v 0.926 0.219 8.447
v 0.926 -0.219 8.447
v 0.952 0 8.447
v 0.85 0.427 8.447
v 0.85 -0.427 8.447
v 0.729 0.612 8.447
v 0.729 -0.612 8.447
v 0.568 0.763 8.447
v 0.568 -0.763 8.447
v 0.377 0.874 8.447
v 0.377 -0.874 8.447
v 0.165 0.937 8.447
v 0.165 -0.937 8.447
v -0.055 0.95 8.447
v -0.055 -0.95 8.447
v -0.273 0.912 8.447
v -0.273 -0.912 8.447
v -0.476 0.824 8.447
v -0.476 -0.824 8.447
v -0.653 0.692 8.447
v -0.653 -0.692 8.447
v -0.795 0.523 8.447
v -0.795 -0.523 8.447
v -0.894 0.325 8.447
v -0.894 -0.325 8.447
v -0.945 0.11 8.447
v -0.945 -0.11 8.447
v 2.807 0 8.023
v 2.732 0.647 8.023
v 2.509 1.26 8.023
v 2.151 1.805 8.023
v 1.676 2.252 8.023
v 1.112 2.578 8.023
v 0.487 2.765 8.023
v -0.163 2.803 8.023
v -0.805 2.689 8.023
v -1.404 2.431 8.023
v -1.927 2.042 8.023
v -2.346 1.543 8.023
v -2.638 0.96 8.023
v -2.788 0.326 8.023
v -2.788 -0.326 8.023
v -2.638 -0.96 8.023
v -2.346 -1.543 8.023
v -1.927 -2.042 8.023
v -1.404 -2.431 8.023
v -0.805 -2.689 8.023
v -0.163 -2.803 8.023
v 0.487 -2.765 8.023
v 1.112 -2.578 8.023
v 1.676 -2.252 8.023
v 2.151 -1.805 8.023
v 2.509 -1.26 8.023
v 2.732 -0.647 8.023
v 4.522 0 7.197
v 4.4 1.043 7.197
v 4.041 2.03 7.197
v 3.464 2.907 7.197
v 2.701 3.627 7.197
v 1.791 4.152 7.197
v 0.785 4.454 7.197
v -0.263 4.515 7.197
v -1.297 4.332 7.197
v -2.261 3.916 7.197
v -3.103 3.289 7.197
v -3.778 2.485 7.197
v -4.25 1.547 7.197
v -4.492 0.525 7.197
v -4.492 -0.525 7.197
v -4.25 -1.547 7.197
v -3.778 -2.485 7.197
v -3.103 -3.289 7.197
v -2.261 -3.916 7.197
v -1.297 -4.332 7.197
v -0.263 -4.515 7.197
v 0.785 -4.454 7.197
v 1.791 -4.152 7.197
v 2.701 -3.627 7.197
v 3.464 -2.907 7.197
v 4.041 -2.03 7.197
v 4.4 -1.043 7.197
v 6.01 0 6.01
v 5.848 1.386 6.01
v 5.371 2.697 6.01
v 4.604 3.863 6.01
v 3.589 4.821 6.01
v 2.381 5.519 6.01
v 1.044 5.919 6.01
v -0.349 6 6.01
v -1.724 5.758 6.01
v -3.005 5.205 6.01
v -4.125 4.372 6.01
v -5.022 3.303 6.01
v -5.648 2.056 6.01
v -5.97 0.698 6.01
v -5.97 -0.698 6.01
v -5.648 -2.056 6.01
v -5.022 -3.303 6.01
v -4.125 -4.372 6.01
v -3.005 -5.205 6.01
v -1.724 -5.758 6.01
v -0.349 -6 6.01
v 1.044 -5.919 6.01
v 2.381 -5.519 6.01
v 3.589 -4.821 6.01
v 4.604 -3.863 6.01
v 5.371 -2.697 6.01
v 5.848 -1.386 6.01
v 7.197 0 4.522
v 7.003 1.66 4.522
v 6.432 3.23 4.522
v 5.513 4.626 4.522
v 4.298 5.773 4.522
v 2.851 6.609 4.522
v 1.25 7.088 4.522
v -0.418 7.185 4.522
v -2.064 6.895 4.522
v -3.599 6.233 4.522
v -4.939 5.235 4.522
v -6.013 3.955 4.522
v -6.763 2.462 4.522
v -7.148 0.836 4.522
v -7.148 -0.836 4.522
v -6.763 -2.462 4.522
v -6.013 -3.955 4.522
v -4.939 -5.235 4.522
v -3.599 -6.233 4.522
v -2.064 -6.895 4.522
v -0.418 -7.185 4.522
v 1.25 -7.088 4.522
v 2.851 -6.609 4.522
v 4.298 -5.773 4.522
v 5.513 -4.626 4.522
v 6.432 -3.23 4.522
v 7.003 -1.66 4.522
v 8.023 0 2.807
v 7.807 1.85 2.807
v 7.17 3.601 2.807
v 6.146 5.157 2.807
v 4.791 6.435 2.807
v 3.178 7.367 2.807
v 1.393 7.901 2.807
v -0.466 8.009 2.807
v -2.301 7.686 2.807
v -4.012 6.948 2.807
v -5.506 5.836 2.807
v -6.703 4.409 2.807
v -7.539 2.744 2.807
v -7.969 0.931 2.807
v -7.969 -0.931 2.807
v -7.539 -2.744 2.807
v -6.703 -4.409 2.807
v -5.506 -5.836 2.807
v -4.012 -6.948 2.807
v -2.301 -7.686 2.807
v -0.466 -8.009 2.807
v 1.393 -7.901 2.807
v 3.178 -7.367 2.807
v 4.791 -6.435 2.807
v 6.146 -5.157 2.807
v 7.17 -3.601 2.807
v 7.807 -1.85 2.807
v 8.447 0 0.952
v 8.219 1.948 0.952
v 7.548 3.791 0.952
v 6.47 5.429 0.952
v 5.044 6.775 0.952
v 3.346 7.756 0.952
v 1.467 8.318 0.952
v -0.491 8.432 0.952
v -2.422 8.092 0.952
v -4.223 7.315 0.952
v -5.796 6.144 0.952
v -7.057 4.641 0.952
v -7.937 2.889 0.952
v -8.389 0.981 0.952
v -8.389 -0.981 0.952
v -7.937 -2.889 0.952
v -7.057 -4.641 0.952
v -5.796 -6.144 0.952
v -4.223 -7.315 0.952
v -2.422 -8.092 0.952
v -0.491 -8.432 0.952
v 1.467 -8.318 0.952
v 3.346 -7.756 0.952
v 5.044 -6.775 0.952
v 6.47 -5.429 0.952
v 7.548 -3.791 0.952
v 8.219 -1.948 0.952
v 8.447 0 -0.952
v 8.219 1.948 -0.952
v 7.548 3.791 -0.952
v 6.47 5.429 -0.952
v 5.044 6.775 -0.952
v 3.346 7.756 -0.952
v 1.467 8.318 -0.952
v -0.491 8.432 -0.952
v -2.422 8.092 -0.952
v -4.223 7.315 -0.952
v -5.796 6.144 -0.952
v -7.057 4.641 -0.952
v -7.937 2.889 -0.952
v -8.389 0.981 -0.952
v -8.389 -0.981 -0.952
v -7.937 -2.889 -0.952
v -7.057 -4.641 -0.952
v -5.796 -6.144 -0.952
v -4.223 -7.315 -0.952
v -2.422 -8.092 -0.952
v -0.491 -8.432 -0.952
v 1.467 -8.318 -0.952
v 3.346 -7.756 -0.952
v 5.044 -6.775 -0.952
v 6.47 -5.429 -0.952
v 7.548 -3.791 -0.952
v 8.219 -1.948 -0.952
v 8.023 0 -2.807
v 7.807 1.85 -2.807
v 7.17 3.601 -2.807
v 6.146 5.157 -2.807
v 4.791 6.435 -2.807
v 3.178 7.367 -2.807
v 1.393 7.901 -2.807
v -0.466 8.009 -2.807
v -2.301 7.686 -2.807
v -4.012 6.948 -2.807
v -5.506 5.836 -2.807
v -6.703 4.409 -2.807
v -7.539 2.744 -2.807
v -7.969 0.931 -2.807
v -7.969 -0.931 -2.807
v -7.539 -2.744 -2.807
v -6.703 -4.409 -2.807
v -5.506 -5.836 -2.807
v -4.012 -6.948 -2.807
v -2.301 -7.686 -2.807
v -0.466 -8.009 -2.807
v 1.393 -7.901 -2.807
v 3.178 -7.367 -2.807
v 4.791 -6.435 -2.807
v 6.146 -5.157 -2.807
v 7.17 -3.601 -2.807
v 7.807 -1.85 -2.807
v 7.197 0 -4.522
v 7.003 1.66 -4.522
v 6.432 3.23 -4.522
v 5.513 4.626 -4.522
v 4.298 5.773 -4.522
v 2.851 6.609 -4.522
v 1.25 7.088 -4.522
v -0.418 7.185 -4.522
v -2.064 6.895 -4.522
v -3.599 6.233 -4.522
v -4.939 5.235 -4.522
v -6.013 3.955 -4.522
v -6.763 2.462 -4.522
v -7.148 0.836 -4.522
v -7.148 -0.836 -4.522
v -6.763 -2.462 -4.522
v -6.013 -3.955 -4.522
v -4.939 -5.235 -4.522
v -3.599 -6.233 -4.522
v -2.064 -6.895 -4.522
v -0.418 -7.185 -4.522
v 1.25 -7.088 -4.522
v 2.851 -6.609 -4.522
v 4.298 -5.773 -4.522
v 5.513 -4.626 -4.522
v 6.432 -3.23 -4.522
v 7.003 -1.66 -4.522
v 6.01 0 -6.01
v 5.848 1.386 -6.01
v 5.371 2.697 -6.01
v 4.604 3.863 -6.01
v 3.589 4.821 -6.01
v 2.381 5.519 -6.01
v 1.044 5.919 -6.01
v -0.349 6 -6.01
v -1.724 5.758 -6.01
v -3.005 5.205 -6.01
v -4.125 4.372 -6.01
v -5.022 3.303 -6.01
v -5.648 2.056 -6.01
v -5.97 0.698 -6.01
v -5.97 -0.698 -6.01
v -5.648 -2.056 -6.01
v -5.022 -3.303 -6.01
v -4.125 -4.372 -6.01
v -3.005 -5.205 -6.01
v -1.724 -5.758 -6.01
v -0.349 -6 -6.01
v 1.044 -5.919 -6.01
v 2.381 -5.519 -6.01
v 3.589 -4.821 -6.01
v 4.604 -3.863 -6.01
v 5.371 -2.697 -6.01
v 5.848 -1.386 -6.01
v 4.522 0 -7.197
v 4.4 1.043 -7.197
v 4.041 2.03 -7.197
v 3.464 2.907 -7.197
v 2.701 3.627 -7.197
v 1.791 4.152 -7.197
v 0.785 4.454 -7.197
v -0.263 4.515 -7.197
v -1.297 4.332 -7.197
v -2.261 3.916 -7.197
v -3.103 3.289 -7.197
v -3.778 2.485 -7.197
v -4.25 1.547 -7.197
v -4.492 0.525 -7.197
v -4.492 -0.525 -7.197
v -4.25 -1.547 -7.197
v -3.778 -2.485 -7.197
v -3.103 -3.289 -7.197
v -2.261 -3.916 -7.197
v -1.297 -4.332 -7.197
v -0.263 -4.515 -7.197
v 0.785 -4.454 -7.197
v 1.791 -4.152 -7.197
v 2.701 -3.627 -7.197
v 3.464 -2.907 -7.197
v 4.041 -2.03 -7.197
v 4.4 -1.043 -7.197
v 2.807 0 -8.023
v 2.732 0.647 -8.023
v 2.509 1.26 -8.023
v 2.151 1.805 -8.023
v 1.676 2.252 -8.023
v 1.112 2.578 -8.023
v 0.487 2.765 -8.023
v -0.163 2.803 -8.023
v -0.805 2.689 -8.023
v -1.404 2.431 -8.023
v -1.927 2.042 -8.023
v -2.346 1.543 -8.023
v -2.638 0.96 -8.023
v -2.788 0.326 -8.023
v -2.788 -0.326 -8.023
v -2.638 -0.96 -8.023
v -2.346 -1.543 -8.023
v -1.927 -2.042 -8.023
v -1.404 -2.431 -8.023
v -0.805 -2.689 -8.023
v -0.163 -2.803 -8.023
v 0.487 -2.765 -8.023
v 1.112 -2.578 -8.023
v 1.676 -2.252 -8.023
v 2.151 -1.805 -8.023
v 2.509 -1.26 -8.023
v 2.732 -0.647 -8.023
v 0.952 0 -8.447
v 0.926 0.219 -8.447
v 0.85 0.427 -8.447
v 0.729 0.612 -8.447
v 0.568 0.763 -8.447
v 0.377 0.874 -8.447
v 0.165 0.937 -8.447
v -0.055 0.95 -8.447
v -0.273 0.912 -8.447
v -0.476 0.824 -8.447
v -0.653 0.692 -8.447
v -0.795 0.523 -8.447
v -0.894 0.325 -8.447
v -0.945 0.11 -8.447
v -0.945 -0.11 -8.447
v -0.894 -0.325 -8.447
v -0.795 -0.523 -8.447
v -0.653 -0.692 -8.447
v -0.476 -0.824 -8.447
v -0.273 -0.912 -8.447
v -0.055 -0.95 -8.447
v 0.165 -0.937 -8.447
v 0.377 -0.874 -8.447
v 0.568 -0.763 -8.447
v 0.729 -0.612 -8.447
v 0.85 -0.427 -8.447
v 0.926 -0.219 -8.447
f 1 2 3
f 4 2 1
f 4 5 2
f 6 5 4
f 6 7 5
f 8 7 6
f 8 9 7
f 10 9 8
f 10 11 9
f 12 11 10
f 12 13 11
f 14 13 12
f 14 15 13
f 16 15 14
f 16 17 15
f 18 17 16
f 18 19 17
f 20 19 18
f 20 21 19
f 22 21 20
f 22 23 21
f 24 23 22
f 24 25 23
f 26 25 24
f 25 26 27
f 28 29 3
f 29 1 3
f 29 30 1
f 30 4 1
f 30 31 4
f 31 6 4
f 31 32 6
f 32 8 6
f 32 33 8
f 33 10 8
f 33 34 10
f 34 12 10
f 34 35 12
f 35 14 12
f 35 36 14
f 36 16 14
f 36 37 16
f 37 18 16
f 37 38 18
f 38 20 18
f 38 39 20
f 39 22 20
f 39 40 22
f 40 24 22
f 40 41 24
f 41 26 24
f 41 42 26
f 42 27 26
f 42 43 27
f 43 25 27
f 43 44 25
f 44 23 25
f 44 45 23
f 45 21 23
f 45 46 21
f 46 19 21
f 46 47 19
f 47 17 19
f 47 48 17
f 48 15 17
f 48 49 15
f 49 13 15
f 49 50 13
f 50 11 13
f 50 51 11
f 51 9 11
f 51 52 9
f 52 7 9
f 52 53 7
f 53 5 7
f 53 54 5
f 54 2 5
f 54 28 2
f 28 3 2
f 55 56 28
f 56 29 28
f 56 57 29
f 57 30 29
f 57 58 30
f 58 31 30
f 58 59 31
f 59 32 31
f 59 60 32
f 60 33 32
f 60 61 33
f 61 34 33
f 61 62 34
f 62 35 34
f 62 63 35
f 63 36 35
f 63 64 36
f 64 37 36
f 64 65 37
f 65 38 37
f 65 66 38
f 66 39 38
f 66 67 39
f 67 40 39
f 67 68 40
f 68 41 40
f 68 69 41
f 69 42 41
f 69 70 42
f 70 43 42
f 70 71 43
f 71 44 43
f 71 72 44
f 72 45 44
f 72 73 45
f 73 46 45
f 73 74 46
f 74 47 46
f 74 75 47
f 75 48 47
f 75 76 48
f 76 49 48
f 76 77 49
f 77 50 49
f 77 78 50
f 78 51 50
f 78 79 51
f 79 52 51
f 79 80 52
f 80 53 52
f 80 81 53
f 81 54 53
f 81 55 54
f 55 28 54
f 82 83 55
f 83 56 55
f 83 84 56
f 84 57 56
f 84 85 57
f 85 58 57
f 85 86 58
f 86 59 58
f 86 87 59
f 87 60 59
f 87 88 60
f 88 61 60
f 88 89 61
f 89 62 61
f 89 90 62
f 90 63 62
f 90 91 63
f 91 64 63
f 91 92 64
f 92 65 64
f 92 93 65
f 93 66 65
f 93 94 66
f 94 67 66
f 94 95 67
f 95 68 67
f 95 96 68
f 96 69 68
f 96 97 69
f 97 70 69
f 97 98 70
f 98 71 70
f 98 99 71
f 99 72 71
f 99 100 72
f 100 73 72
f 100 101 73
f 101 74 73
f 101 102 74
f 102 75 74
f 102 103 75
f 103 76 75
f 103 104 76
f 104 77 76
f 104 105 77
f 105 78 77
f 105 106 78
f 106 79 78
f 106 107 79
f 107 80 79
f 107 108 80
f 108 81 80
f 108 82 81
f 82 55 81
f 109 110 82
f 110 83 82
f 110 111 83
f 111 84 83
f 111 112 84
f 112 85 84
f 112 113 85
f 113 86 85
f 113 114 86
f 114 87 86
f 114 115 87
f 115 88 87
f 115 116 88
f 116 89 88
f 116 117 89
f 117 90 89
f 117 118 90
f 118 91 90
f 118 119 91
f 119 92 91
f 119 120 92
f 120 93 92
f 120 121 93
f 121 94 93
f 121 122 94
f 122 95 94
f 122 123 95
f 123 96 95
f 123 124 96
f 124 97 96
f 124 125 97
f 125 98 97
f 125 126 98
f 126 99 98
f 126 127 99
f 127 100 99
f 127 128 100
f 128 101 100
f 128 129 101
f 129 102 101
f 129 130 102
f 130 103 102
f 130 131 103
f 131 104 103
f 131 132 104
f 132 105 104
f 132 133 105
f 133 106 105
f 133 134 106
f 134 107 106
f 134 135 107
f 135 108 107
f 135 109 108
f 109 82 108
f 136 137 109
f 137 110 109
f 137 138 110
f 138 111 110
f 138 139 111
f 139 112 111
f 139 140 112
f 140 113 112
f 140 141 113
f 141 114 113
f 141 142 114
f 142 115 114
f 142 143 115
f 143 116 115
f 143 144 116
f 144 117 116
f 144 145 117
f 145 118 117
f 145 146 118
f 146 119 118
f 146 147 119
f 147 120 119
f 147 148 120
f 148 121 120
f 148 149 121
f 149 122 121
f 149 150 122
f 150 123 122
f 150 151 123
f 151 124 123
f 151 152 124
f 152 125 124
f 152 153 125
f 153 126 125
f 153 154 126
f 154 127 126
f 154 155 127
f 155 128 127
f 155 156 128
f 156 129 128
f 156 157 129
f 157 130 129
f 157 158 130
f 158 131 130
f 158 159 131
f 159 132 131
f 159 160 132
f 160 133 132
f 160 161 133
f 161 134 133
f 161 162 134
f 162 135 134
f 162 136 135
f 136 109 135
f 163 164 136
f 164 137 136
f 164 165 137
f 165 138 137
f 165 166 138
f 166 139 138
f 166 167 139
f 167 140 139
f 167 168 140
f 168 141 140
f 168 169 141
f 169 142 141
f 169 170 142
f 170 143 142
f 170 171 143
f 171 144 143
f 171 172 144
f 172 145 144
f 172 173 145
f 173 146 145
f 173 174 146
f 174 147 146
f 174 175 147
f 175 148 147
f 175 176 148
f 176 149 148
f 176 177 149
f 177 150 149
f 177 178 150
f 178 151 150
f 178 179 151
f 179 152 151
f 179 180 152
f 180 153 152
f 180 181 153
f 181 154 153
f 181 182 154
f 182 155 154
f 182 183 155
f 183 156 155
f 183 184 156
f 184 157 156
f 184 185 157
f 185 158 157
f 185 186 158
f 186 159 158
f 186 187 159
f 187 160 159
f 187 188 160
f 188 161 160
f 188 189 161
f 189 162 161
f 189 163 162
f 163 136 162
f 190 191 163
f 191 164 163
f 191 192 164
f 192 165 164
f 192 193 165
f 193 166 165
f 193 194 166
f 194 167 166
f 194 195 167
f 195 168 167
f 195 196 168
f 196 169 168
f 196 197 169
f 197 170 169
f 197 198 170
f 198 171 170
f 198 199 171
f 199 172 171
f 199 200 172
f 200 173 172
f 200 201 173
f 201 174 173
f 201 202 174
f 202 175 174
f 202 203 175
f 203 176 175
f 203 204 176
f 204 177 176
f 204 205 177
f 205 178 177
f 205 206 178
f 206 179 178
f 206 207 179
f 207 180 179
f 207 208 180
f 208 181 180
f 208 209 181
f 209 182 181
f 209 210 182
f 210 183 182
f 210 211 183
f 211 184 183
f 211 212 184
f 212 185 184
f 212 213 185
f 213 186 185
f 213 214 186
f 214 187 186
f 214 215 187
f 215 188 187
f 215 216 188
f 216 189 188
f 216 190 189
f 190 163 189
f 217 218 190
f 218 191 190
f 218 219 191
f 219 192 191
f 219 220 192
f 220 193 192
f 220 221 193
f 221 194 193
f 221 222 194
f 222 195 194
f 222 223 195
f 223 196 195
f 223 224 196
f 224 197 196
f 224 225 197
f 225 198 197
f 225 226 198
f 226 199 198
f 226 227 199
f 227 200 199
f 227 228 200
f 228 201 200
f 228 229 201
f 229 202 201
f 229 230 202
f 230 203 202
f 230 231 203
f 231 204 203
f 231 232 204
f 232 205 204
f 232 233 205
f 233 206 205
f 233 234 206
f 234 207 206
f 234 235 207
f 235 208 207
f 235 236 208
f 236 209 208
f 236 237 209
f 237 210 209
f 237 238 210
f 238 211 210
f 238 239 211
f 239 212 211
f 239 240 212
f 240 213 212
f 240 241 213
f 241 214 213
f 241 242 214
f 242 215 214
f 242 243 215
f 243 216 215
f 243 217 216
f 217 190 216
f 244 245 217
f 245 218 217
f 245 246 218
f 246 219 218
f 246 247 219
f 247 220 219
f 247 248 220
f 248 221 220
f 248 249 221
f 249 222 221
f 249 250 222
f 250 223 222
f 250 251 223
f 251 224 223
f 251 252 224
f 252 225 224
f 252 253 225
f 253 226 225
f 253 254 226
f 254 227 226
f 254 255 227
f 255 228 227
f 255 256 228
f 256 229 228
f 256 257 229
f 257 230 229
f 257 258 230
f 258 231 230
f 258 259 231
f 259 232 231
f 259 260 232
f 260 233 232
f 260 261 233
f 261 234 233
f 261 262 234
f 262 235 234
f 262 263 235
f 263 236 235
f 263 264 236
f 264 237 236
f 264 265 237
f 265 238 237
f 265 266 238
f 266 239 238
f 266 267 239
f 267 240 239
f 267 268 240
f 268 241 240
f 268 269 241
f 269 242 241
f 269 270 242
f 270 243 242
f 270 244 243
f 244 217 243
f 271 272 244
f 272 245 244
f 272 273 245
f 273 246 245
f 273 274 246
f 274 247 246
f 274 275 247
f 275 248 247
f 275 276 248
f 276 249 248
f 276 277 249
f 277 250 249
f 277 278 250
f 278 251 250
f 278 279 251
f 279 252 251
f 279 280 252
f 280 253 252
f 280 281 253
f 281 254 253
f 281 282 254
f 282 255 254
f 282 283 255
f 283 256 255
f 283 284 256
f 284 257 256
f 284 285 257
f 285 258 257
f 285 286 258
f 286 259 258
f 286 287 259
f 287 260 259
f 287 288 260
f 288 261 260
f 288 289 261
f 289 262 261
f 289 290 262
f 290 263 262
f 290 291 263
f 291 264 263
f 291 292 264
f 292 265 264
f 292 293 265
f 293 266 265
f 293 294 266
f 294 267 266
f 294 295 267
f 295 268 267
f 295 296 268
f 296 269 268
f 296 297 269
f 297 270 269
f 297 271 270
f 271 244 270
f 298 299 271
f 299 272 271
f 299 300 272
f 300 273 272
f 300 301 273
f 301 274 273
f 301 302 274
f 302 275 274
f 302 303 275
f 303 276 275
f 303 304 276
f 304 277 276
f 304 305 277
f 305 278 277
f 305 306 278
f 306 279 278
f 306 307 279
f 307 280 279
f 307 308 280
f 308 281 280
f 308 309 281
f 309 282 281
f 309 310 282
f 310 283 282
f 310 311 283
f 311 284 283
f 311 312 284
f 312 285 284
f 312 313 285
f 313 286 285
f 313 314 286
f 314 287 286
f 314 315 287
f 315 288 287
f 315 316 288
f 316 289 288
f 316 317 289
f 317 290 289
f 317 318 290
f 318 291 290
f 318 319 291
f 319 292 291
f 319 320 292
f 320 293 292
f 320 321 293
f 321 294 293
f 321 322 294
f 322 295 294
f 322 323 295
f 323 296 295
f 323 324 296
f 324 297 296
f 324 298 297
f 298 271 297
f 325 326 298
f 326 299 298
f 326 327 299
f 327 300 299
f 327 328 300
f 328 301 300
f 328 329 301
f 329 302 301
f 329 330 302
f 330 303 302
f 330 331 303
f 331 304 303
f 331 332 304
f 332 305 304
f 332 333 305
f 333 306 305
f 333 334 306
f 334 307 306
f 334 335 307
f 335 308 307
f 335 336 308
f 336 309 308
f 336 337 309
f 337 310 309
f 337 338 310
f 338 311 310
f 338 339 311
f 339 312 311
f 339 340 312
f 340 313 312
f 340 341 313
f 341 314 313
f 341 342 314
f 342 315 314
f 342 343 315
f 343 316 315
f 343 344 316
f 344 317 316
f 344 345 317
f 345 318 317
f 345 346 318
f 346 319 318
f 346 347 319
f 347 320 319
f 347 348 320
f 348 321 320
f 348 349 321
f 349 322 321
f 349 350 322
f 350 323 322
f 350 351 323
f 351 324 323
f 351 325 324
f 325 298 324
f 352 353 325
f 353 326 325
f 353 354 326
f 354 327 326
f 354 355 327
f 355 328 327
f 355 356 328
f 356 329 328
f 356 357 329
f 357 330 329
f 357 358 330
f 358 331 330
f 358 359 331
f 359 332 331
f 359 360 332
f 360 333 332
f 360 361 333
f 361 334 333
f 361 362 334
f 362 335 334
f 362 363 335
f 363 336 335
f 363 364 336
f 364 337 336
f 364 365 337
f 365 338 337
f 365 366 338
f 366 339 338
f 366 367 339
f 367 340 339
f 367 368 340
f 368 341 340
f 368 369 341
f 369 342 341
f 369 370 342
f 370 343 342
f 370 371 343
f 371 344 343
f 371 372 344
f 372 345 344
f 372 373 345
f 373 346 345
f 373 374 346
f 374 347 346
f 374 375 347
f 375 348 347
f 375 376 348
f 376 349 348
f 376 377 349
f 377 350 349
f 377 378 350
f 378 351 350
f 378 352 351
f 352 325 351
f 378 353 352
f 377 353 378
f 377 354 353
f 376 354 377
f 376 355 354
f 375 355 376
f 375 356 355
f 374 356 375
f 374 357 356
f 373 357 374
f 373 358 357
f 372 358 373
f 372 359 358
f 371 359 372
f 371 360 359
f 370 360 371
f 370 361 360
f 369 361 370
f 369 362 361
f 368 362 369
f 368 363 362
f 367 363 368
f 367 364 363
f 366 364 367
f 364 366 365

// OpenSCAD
// Generated by SolidPython 1.0.1 on 2020-07-29 00:02:42


sphere(d = 17, r = 5);
/***********************************************
*********      SolidPython code:      **********
************************************************
 
# import packages: SolidPython
from solid import *
from solid.utils import *
from itertools import chain, combinations


class Resize:

    def __init__(self, scad_file):
        self.scad_file = scad_file
        #self.scad_file = import_scad(scad_file)
        # cone/cylinder param:
        self.r1 = 0
        self.r2 = 0
        self.h = 0
        # rectangular prism param:
        self.w = 0
        self.l = 0
        # ellipse param:
        self.r = 0

    # import OpenScad code (file name corresponds to shape)


    # classify shape + parameters
    def assign(self, param1, param2, param3):
        if self.scad_file == 'cone.scad':
            self.r1 = param1
            self.r2 = param2
            self.h = param3
        elif self.scad_file == 'cylinder.scad':
            self.r1 = param1
            self.r2 = param2
            self.h = param3
        elif self.scad_file == 'rectangularPrism.scad':
            self.h = param1
            self.l = param2
            self.w = param3
        else:
            self.r = param1
            self.h = param2

    # resize parameters
    def iterate(self):
        x = range(3, 20, 2)
        i = 1
        if self.scad_file == 'cone.scad':
            tempList = list(combinations(x, 3))
            #print(tempList)
            for i in x:
                for j in range (3):
                    param1 = tempList[i][0]
                    param2 = tempList[i][1]
                    param3 = tempList[i][2]
                    filepath = 'produced_scad_files/' + 'cone' + str(param1) + '_' + str(param2) + '_' + str(param3) + '.scad'
                    scad_render_to_file(cylinder(h=param1, r1=param2, r2=param3), filepath)

        elif self.scad_file == 'cylinder.scad':
            tempList = list(combinations(x, 3))
            for i in x:
                for j in range(3):
                    param1 = tempList[i][0]
                    param2 = tempList[i][1]
                    param3 = tempList[i][2]
                    filepath = 'produced_scad_files/' + 'cylinder' + str(param1) + '_' + str(param2) + '_' + str(param3) + '.scad'
                    scad_render_to_file(cylinder(h=param1, r1=param2, r2=param3), filepath)

        elif self.scad_file == 'rectangularPrism.scad':
            tempList = list(combinations(x, 3))
            for i in x:
                for j in range(3):
                    param1 = tempList[i][0]
                    param2 = tempList[i][1]
                    param3 = tempList[i][2]
                    filepath = 'produced_scad_files/' + 'rectangularPrism' + str(param1) + '_' + str(param2) + '_' + str(
                        param3) + '.scad'
                    scad_render_to_file(cube(size=(param1, param2, param3)), filepath)

        else:
            tempList = list(combinations(x, 2))
            for i in x:
                for j in range(3):
                    param1 = tempList[i][0]
                    param2 = tempList[i][1]
                    filepath = 'produced_scad_files/' + 'ellipse' + str(param1) + '_' + str(param2) + '_' + '.scad'
                    scad_render_to_file(sphere(param1, param2), filepath)

    def render_to_scadfile(self):
        scad_render_to_file(scad, 'example.scad') 
 
************************************************/
